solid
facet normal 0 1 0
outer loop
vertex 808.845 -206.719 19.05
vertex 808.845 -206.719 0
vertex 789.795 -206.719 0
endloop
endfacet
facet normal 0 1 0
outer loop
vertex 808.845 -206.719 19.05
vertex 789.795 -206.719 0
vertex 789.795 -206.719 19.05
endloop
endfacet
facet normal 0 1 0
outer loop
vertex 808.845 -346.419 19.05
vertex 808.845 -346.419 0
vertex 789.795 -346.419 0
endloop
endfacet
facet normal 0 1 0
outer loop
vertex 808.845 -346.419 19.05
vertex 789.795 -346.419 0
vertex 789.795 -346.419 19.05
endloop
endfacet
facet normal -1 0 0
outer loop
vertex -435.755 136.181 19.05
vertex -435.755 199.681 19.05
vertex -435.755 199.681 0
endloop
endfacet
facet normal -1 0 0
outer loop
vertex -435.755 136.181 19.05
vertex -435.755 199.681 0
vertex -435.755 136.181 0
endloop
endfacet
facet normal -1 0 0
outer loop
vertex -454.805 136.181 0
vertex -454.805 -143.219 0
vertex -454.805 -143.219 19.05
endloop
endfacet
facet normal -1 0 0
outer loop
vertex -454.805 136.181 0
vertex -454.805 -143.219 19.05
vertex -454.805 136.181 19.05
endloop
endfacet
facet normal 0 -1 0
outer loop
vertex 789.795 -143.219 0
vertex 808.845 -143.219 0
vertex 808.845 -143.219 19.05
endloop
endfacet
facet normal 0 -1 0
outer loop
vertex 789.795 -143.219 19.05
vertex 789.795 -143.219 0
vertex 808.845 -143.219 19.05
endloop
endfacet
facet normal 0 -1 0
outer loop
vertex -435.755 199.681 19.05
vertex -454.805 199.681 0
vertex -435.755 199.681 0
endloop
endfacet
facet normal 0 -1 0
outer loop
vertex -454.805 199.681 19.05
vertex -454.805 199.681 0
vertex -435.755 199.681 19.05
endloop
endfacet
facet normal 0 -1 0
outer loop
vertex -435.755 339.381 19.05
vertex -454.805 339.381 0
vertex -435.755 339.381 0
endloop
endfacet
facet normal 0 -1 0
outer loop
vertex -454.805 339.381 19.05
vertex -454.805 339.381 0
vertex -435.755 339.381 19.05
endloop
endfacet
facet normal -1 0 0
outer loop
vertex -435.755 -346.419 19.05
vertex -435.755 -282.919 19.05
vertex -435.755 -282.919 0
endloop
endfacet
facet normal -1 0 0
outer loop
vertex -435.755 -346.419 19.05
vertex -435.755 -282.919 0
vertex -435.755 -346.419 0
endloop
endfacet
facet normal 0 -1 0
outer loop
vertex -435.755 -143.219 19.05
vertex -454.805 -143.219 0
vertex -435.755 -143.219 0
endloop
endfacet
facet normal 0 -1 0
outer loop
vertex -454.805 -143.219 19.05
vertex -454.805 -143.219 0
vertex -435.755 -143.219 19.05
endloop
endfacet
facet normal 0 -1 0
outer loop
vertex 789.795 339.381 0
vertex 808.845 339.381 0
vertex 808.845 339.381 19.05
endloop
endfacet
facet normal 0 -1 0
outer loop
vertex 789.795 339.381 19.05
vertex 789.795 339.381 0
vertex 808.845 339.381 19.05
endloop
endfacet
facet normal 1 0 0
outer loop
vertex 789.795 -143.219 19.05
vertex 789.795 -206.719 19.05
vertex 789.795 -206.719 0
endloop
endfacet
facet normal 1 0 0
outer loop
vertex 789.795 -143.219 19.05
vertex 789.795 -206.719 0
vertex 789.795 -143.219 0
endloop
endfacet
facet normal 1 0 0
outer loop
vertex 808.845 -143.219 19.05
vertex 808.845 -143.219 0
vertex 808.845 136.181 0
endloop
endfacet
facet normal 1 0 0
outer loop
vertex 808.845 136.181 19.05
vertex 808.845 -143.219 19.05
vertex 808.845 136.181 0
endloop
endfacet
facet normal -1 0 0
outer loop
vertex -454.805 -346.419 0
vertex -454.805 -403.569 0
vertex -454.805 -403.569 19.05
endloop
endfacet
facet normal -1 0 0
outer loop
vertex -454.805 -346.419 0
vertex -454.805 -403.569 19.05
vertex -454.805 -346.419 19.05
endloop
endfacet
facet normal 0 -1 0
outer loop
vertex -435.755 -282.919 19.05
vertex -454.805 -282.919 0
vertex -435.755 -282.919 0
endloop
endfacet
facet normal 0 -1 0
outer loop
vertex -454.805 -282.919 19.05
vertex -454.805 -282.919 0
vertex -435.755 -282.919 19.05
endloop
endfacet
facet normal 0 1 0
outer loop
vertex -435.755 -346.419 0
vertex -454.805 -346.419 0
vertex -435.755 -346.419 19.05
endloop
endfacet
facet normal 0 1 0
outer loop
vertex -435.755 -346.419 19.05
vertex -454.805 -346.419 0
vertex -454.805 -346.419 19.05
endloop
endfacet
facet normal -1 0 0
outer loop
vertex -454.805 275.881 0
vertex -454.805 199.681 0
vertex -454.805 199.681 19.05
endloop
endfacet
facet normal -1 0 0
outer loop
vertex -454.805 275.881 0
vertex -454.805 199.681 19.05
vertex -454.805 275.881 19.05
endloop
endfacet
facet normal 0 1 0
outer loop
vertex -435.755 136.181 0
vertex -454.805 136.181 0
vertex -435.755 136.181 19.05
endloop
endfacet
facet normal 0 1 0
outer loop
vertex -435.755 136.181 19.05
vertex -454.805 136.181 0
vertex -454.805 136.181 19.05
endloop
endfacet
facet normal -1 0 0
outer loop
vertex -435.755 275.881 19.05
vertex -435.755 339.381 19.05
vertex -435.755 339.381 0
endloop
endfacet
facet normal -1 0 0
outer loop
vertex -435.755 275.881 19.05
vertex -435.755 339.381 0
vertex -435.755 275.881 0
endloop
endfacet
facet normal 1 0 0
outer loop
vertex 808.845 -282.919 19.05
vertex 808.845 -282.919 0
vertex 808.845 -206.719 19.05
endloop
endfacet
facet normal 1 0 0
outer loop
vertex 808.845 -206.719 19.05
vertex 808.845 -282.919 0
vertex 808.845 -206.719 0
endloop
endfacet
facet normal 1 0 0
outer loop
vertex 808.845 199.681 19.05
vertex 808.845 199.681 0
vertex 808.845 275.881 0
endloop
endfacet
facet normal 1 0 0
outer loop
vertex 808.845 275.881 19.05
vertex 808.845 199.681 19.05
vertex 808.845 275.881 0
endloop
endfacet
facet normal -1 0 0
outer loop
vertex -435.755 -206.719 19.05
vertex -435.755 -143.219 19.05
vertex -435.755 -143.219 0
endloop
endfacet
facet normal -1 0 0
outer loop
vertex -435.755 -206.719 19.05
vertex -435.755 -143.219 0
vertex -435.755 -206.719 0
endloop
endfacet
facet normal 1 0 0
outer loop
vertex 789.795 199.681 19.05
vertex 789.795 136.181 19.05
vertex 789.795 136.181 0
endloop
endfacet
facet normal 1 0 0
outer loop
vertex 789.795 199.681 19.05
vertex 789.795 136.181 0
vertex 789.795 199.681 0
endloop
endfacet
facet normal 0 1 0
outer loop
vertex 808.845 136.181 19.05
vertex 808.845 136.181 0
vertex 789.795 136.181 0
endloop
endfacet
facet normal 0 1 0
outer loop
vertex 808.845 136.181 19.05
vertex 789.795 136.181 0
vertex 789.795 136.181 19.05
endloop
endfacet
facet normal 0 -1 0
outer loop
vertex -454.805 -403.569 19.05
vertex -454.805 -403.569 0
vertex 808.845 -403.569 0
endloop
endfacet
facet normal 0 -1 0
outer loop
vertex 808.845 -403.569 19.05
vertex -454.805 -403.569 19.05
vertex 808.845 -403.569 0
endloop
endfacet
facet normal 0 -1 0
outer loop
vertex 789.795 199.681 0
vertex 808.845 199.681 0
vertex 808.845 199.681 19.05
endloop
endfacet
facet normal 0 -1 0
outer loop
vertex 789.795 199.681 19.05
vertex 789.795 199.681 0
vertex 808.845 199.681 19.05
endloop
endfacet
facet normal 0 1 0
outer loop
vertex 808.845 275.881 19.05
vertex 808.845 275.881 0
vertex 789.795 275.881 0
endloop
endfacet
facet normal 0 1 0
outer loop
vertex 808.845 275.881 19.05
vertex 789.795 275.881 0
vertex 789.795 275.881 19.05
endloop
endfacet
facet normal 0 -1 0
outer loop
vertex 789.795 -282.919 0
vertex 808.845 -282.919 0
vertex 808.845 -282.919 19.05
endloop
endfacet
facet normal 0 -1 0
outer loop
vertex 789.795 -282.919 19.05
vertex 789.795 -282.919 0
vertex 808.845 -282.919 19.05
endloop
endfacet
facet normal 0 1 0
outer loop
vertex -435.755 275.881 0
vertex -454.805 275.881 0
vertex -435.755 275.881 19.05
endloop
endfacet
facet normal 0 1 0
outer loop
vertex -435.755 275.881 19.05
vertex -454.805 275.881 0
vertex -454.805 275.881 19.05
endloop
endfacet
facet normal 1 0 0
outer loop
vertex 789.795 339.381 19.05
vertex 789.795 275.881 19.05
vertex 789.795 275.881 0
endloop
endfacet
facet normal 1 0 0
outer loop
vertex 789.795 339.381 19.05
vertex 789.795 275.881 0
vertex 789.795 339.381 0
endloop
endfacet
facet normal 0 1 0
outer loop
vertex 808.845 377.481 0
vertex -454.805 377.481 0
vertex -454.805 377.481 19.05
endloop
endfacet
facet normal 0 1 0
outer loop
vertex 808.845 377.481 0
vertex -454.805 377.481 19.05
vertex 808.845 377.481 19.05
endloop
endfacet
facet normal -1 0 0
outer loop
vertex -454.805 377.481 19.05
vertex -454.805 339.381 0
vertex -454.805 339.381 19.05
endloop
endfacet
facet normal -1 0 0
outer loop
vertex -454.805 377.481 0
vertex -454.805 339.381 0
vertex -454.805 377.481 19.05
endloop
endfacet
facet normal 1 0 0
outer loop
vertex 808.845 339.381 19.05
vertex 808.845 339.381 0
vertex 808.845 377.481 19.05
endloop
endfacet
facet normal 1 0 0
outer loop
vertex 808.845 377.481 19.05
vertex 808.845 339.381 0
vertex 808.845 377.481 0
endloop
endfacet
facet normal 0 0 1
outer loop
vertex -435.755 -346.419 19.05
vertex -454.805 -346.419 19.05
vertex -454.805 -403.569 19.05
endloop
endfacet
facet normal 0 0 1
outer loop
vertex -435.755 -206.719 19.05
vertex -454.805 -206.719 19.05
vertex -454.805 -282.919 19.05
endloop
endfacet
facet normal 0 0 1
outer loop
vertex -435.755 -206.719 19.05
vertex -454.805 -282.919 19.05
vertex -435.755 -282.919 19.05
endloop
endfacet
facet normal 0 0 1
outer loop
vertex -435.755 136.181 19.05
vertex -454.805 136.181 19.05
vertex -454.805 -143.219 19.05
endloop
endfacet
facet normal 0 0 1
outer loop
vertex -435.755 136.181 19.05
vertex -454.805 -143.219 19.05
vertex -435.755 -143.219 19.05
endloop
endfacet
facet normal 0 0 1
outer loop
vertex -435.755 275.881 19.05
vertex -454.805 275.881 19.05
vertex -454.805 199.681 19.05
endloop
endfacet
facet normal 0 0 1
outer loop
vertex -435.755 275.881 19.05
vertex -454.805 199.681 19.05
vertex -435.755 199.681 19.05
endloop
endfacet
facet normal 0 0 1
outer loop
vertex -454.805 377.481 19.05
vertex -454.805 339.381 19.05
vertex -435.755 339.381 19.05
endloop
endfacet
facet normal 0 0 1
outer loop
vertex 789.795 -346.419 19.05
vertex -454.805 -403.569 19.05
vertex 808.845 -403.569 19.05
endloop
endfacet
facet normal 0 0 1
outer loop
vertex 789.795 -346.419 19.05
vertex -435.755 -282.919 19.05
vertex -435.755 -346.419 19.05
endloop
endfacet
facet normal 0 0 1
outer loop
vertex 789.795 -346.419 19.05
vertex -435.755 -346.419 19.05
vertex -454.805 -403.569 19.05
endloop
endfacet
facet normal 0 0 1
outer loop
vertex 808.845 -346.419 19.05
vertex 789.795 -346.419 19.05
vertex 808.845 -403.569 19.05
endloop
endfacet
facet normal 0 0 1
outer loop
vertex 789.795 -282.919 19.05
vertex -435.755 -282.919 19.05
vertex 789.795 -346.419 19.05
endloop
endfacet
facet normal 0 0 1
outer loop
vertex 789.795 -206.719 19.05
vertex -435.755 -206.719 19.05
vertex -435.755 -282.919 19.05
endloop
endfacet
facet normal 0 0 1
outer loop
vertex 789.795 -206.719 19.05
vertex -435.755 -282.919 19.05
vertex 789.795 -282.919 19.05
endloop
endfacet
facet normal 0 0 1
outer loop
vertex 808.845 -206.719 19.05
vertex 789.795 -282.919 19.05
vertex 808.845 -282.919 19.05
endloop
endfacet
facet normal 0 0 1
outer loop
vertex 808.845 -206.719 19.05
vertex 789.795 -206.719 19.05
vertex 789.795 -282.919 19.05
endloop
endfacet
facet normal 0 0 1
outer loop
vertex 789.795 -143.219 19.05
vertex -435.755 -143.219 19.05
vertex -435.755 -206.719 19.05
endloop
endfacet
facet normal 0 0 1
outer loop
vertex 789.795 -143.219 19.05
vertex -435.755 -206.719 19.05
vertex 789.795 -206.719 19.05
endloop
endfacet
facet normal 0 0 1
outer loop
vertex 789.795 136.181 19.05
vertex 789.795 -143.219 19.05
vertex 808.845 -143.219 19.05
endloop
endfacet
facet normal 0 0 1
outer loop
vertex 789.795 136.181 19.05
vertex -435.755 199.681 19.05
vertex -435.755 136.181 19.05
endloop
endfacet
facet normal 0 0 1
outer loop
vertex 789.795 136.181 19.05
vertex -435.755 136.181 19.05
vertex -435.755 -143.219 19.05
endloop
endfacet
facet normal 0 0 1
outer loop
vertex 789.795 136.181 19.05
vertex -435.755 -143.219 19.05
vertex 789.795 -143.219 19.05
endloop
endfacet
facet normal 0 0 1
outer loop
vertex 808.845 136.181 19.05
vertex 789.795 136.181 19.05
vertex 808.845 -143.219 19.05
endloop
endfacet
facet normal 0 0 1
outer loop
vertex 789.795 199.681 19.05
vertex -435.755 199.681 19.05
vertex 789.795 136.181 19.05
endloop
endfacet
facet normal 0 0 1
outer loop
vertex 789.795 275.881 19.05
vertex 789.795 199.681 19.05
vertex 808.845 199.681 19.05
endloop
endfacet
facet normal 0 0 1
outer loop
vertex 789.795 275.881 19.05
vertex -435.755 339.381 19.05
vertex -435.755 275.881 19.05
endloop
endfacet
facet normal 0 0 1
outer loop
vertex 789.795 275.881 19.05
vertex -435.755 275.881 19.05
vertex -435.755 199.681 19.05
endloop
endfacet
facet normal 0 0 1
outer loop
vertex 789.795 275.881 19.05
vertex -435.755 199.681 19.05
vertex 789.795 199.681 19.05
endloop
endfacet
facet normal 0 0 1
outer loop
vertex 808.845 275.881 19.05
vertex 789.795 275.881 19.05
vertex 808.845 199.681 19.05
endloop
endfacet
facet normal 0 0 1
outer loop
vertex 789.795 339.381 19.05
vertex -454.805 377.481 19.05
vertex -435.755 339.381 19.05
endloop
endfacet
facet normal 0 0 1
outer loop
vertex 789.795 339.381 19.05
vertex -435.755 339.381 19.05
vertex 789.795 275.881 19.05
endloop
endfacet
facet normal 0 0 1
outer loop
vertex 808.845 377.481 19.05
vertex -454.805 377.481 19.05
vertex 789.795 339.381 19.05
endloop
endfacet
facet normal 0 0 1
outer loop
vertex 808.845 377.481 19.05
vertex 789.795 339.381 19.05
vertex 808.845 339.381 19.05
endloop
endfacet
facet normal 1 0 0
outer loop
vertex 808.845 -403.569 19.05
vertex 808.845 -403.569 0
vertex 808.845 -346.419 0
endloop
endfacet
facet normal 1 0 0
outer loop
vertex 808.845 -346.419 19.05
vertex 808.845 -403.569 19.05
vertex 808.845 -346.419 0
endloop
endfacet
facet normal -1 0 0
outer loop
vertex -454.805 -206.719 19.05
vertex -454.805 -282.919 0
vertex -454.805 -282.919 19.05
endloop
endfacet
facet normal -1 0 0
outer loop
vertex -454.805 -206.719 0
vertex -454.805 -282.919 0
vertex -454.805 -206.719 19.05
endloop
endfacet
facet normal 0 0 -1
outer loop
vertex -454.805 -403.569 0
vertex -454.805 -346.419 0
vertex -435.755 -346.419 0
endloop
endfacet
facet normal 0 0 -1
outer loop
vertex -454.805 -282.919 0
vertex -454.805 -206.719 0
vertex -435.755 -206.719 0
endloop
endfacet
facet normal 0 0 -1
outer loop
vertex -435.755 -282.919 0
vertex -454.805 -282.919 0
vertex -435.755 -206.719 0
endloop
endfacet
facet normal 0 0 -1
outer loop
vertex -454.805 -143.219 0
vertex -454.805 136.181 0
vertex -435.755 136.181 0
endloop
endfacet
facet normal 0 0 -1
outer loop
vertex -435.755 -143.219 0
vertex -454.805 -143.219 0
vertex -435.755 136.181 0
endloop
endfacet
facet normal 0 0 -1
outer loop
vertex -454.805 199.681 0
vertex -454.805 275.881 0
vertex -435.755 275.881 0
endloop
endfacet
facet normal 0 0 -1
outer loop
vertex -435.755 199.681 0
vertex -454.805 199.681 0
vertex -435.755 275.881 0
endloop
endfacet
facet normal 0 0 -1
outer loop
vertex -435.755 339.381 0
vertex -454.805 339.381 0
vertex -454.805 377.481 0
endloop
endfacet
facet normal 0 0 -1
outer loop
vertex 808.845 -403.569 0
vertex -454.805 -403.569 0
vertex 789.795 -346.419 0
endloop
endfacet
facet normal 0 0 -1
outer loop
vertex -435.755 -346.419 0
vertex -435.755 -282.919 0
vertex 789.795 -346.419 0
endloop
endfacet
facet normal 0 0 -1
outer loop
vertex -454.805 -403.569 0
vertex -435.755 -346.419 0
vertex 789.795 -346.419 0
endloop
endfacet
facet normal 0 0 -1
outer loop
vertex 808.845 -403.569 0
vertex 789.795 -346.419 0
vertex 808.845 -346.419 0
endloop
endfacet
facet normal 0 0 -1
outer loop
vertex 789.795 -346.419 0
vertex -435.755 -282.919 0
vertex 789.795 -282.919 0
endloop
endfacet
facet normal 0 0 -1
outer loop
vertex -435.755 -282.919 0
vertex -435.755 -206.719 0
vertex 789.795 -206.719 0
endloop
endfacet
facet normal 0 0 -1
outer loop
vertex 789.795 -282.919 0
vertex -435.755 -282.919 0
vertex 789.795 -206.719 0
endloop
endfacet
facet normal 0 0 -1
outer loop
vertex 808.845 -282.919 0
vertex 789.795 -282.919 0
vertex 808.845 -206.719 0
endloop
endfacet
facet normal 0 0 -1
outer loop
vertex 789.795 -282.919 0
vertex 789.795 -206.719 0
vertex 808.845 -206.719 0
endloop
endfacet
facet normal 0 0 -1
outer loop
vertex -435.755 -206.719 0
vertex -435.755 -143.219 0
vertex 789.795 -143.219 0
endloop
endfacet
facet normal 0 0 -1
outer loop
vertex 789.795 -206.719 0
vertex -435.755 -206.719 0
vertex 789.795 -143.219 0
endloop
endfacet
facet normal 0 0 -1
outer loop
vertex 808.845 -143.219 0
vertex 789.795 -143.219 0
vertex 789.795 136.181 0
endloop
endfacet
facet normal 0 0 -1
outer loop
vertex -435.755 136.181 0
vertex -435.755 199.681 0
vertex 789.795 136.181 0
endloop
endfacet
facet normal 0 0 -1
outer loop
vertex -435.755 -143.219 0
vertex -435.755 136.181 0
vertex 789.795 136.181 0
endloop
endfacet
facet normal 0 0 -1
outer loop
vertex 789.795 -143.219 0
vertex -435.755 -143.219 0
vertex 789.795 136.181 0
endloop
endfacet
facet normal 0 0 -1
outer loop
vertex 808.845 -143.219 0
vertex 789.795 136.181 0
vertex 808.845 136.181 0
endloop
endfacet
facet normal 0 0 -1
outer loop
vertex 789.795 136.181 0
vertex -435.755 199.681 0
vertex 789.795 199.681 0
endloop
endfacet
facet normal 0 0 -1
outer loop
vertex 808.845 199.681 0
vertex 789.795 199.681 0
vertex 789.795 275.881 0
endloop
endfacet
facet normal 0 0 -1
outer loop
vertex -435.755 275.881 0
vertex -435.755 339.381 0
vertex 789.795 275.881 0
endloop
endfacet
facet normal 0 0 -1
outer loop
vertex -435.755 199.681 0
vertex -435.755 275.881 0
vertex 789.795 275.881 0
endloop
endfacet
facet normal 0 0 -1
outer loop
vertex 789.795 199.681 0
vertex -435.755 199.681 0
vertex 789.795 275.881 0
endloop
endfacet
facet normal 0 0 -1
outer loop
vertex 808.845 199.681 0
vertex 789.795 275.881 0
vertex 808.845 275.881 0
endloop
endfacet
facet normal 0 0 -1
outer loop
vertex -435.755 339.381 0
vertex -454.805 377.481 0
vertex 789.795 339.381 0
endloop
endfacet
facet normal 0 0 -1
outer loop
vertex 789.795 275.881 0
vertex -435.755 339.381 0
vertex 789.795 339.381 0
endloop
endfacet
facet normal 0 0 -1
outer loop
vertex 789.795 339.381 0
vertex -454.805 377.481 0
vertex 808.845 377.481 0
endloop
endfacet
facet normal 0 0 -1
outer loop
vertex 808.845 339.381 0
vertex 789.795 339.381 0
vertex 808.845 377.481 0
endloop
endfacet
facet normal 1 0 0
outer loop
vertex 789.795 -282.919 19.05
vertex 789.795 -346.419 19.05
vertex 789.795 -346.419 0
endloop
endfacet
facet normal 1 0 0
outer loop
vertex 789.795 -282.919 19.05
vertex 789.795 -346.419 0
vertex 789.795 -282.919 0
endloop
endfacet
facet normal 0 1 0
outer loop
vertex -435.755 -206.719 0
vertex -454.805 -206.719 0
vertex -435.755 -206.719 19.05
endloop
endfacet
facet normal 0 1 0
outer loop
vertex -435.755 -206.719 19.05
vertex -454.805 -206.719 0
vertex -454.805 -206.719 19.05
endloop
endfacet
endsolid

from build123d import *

# Parameters (mm, degrees)
F0_W     = 1263.65
F0_H     = 781.05
F1_DEPTH = 19.05
F2_W     = 63.5
F2_H     = 19.05
F3_DEPTH = 19.05
F4_W     = 63.5
F4_H     = 19.05
F5_DEPTH = 19.05


with BuildPart() as f1:
    # F0 (on Top) → F1 (new body)
    with BuildSketch(Plane.XY):
        with Locations((177.019935, -13.043978)):
            Rectangle(F0_W, F0_H)
    extrude(amount=F1_DEPTH)

    # F2 (on face) → F3 (cut)
    with BuildSketch(Plane.YZ.offset(808.844935)):
        with Locations((307.631022, 9.525)):
            Rectangle(F2_W, F2_H)
        with Locations((167.931022, 9.525)):
            Rectangle(F2_W, F2_H)
        with Locations((-174.968978, 9.525)):
            Rectangle(F2_W, F2_H)
        with Locations((-314.668978, 9.525)):
            Rectangle(F2_W, F2_H)
    extrude(amount=-F3_DEPTH, mode=Mode.SUBTRACT)

    # F4 (on face) → F5 (cut)
    with BuildSketch(Plane(origin=(-454.805065, 0, 0), x_dir=(0, -1, 0), z_dir=(-1, 0, 0))):
        with Locations((-167.931022, 9.525)):
            Rectangle(F4_W, F4_H)
        with Locations((174.968978, 9.525)):
            Rectangle(F4_W, F4_H)
        with Locations((314.668978, 9.525)):
            Rectangle(F4_W, F4_H)
        with Locations((-307.631022, 9.525)):
            Rectangle(F4_W, F4_H)
    extrude(amount=-F5_DEPTH, mode=Mode.SUBTRACT)


solid = f1.part
